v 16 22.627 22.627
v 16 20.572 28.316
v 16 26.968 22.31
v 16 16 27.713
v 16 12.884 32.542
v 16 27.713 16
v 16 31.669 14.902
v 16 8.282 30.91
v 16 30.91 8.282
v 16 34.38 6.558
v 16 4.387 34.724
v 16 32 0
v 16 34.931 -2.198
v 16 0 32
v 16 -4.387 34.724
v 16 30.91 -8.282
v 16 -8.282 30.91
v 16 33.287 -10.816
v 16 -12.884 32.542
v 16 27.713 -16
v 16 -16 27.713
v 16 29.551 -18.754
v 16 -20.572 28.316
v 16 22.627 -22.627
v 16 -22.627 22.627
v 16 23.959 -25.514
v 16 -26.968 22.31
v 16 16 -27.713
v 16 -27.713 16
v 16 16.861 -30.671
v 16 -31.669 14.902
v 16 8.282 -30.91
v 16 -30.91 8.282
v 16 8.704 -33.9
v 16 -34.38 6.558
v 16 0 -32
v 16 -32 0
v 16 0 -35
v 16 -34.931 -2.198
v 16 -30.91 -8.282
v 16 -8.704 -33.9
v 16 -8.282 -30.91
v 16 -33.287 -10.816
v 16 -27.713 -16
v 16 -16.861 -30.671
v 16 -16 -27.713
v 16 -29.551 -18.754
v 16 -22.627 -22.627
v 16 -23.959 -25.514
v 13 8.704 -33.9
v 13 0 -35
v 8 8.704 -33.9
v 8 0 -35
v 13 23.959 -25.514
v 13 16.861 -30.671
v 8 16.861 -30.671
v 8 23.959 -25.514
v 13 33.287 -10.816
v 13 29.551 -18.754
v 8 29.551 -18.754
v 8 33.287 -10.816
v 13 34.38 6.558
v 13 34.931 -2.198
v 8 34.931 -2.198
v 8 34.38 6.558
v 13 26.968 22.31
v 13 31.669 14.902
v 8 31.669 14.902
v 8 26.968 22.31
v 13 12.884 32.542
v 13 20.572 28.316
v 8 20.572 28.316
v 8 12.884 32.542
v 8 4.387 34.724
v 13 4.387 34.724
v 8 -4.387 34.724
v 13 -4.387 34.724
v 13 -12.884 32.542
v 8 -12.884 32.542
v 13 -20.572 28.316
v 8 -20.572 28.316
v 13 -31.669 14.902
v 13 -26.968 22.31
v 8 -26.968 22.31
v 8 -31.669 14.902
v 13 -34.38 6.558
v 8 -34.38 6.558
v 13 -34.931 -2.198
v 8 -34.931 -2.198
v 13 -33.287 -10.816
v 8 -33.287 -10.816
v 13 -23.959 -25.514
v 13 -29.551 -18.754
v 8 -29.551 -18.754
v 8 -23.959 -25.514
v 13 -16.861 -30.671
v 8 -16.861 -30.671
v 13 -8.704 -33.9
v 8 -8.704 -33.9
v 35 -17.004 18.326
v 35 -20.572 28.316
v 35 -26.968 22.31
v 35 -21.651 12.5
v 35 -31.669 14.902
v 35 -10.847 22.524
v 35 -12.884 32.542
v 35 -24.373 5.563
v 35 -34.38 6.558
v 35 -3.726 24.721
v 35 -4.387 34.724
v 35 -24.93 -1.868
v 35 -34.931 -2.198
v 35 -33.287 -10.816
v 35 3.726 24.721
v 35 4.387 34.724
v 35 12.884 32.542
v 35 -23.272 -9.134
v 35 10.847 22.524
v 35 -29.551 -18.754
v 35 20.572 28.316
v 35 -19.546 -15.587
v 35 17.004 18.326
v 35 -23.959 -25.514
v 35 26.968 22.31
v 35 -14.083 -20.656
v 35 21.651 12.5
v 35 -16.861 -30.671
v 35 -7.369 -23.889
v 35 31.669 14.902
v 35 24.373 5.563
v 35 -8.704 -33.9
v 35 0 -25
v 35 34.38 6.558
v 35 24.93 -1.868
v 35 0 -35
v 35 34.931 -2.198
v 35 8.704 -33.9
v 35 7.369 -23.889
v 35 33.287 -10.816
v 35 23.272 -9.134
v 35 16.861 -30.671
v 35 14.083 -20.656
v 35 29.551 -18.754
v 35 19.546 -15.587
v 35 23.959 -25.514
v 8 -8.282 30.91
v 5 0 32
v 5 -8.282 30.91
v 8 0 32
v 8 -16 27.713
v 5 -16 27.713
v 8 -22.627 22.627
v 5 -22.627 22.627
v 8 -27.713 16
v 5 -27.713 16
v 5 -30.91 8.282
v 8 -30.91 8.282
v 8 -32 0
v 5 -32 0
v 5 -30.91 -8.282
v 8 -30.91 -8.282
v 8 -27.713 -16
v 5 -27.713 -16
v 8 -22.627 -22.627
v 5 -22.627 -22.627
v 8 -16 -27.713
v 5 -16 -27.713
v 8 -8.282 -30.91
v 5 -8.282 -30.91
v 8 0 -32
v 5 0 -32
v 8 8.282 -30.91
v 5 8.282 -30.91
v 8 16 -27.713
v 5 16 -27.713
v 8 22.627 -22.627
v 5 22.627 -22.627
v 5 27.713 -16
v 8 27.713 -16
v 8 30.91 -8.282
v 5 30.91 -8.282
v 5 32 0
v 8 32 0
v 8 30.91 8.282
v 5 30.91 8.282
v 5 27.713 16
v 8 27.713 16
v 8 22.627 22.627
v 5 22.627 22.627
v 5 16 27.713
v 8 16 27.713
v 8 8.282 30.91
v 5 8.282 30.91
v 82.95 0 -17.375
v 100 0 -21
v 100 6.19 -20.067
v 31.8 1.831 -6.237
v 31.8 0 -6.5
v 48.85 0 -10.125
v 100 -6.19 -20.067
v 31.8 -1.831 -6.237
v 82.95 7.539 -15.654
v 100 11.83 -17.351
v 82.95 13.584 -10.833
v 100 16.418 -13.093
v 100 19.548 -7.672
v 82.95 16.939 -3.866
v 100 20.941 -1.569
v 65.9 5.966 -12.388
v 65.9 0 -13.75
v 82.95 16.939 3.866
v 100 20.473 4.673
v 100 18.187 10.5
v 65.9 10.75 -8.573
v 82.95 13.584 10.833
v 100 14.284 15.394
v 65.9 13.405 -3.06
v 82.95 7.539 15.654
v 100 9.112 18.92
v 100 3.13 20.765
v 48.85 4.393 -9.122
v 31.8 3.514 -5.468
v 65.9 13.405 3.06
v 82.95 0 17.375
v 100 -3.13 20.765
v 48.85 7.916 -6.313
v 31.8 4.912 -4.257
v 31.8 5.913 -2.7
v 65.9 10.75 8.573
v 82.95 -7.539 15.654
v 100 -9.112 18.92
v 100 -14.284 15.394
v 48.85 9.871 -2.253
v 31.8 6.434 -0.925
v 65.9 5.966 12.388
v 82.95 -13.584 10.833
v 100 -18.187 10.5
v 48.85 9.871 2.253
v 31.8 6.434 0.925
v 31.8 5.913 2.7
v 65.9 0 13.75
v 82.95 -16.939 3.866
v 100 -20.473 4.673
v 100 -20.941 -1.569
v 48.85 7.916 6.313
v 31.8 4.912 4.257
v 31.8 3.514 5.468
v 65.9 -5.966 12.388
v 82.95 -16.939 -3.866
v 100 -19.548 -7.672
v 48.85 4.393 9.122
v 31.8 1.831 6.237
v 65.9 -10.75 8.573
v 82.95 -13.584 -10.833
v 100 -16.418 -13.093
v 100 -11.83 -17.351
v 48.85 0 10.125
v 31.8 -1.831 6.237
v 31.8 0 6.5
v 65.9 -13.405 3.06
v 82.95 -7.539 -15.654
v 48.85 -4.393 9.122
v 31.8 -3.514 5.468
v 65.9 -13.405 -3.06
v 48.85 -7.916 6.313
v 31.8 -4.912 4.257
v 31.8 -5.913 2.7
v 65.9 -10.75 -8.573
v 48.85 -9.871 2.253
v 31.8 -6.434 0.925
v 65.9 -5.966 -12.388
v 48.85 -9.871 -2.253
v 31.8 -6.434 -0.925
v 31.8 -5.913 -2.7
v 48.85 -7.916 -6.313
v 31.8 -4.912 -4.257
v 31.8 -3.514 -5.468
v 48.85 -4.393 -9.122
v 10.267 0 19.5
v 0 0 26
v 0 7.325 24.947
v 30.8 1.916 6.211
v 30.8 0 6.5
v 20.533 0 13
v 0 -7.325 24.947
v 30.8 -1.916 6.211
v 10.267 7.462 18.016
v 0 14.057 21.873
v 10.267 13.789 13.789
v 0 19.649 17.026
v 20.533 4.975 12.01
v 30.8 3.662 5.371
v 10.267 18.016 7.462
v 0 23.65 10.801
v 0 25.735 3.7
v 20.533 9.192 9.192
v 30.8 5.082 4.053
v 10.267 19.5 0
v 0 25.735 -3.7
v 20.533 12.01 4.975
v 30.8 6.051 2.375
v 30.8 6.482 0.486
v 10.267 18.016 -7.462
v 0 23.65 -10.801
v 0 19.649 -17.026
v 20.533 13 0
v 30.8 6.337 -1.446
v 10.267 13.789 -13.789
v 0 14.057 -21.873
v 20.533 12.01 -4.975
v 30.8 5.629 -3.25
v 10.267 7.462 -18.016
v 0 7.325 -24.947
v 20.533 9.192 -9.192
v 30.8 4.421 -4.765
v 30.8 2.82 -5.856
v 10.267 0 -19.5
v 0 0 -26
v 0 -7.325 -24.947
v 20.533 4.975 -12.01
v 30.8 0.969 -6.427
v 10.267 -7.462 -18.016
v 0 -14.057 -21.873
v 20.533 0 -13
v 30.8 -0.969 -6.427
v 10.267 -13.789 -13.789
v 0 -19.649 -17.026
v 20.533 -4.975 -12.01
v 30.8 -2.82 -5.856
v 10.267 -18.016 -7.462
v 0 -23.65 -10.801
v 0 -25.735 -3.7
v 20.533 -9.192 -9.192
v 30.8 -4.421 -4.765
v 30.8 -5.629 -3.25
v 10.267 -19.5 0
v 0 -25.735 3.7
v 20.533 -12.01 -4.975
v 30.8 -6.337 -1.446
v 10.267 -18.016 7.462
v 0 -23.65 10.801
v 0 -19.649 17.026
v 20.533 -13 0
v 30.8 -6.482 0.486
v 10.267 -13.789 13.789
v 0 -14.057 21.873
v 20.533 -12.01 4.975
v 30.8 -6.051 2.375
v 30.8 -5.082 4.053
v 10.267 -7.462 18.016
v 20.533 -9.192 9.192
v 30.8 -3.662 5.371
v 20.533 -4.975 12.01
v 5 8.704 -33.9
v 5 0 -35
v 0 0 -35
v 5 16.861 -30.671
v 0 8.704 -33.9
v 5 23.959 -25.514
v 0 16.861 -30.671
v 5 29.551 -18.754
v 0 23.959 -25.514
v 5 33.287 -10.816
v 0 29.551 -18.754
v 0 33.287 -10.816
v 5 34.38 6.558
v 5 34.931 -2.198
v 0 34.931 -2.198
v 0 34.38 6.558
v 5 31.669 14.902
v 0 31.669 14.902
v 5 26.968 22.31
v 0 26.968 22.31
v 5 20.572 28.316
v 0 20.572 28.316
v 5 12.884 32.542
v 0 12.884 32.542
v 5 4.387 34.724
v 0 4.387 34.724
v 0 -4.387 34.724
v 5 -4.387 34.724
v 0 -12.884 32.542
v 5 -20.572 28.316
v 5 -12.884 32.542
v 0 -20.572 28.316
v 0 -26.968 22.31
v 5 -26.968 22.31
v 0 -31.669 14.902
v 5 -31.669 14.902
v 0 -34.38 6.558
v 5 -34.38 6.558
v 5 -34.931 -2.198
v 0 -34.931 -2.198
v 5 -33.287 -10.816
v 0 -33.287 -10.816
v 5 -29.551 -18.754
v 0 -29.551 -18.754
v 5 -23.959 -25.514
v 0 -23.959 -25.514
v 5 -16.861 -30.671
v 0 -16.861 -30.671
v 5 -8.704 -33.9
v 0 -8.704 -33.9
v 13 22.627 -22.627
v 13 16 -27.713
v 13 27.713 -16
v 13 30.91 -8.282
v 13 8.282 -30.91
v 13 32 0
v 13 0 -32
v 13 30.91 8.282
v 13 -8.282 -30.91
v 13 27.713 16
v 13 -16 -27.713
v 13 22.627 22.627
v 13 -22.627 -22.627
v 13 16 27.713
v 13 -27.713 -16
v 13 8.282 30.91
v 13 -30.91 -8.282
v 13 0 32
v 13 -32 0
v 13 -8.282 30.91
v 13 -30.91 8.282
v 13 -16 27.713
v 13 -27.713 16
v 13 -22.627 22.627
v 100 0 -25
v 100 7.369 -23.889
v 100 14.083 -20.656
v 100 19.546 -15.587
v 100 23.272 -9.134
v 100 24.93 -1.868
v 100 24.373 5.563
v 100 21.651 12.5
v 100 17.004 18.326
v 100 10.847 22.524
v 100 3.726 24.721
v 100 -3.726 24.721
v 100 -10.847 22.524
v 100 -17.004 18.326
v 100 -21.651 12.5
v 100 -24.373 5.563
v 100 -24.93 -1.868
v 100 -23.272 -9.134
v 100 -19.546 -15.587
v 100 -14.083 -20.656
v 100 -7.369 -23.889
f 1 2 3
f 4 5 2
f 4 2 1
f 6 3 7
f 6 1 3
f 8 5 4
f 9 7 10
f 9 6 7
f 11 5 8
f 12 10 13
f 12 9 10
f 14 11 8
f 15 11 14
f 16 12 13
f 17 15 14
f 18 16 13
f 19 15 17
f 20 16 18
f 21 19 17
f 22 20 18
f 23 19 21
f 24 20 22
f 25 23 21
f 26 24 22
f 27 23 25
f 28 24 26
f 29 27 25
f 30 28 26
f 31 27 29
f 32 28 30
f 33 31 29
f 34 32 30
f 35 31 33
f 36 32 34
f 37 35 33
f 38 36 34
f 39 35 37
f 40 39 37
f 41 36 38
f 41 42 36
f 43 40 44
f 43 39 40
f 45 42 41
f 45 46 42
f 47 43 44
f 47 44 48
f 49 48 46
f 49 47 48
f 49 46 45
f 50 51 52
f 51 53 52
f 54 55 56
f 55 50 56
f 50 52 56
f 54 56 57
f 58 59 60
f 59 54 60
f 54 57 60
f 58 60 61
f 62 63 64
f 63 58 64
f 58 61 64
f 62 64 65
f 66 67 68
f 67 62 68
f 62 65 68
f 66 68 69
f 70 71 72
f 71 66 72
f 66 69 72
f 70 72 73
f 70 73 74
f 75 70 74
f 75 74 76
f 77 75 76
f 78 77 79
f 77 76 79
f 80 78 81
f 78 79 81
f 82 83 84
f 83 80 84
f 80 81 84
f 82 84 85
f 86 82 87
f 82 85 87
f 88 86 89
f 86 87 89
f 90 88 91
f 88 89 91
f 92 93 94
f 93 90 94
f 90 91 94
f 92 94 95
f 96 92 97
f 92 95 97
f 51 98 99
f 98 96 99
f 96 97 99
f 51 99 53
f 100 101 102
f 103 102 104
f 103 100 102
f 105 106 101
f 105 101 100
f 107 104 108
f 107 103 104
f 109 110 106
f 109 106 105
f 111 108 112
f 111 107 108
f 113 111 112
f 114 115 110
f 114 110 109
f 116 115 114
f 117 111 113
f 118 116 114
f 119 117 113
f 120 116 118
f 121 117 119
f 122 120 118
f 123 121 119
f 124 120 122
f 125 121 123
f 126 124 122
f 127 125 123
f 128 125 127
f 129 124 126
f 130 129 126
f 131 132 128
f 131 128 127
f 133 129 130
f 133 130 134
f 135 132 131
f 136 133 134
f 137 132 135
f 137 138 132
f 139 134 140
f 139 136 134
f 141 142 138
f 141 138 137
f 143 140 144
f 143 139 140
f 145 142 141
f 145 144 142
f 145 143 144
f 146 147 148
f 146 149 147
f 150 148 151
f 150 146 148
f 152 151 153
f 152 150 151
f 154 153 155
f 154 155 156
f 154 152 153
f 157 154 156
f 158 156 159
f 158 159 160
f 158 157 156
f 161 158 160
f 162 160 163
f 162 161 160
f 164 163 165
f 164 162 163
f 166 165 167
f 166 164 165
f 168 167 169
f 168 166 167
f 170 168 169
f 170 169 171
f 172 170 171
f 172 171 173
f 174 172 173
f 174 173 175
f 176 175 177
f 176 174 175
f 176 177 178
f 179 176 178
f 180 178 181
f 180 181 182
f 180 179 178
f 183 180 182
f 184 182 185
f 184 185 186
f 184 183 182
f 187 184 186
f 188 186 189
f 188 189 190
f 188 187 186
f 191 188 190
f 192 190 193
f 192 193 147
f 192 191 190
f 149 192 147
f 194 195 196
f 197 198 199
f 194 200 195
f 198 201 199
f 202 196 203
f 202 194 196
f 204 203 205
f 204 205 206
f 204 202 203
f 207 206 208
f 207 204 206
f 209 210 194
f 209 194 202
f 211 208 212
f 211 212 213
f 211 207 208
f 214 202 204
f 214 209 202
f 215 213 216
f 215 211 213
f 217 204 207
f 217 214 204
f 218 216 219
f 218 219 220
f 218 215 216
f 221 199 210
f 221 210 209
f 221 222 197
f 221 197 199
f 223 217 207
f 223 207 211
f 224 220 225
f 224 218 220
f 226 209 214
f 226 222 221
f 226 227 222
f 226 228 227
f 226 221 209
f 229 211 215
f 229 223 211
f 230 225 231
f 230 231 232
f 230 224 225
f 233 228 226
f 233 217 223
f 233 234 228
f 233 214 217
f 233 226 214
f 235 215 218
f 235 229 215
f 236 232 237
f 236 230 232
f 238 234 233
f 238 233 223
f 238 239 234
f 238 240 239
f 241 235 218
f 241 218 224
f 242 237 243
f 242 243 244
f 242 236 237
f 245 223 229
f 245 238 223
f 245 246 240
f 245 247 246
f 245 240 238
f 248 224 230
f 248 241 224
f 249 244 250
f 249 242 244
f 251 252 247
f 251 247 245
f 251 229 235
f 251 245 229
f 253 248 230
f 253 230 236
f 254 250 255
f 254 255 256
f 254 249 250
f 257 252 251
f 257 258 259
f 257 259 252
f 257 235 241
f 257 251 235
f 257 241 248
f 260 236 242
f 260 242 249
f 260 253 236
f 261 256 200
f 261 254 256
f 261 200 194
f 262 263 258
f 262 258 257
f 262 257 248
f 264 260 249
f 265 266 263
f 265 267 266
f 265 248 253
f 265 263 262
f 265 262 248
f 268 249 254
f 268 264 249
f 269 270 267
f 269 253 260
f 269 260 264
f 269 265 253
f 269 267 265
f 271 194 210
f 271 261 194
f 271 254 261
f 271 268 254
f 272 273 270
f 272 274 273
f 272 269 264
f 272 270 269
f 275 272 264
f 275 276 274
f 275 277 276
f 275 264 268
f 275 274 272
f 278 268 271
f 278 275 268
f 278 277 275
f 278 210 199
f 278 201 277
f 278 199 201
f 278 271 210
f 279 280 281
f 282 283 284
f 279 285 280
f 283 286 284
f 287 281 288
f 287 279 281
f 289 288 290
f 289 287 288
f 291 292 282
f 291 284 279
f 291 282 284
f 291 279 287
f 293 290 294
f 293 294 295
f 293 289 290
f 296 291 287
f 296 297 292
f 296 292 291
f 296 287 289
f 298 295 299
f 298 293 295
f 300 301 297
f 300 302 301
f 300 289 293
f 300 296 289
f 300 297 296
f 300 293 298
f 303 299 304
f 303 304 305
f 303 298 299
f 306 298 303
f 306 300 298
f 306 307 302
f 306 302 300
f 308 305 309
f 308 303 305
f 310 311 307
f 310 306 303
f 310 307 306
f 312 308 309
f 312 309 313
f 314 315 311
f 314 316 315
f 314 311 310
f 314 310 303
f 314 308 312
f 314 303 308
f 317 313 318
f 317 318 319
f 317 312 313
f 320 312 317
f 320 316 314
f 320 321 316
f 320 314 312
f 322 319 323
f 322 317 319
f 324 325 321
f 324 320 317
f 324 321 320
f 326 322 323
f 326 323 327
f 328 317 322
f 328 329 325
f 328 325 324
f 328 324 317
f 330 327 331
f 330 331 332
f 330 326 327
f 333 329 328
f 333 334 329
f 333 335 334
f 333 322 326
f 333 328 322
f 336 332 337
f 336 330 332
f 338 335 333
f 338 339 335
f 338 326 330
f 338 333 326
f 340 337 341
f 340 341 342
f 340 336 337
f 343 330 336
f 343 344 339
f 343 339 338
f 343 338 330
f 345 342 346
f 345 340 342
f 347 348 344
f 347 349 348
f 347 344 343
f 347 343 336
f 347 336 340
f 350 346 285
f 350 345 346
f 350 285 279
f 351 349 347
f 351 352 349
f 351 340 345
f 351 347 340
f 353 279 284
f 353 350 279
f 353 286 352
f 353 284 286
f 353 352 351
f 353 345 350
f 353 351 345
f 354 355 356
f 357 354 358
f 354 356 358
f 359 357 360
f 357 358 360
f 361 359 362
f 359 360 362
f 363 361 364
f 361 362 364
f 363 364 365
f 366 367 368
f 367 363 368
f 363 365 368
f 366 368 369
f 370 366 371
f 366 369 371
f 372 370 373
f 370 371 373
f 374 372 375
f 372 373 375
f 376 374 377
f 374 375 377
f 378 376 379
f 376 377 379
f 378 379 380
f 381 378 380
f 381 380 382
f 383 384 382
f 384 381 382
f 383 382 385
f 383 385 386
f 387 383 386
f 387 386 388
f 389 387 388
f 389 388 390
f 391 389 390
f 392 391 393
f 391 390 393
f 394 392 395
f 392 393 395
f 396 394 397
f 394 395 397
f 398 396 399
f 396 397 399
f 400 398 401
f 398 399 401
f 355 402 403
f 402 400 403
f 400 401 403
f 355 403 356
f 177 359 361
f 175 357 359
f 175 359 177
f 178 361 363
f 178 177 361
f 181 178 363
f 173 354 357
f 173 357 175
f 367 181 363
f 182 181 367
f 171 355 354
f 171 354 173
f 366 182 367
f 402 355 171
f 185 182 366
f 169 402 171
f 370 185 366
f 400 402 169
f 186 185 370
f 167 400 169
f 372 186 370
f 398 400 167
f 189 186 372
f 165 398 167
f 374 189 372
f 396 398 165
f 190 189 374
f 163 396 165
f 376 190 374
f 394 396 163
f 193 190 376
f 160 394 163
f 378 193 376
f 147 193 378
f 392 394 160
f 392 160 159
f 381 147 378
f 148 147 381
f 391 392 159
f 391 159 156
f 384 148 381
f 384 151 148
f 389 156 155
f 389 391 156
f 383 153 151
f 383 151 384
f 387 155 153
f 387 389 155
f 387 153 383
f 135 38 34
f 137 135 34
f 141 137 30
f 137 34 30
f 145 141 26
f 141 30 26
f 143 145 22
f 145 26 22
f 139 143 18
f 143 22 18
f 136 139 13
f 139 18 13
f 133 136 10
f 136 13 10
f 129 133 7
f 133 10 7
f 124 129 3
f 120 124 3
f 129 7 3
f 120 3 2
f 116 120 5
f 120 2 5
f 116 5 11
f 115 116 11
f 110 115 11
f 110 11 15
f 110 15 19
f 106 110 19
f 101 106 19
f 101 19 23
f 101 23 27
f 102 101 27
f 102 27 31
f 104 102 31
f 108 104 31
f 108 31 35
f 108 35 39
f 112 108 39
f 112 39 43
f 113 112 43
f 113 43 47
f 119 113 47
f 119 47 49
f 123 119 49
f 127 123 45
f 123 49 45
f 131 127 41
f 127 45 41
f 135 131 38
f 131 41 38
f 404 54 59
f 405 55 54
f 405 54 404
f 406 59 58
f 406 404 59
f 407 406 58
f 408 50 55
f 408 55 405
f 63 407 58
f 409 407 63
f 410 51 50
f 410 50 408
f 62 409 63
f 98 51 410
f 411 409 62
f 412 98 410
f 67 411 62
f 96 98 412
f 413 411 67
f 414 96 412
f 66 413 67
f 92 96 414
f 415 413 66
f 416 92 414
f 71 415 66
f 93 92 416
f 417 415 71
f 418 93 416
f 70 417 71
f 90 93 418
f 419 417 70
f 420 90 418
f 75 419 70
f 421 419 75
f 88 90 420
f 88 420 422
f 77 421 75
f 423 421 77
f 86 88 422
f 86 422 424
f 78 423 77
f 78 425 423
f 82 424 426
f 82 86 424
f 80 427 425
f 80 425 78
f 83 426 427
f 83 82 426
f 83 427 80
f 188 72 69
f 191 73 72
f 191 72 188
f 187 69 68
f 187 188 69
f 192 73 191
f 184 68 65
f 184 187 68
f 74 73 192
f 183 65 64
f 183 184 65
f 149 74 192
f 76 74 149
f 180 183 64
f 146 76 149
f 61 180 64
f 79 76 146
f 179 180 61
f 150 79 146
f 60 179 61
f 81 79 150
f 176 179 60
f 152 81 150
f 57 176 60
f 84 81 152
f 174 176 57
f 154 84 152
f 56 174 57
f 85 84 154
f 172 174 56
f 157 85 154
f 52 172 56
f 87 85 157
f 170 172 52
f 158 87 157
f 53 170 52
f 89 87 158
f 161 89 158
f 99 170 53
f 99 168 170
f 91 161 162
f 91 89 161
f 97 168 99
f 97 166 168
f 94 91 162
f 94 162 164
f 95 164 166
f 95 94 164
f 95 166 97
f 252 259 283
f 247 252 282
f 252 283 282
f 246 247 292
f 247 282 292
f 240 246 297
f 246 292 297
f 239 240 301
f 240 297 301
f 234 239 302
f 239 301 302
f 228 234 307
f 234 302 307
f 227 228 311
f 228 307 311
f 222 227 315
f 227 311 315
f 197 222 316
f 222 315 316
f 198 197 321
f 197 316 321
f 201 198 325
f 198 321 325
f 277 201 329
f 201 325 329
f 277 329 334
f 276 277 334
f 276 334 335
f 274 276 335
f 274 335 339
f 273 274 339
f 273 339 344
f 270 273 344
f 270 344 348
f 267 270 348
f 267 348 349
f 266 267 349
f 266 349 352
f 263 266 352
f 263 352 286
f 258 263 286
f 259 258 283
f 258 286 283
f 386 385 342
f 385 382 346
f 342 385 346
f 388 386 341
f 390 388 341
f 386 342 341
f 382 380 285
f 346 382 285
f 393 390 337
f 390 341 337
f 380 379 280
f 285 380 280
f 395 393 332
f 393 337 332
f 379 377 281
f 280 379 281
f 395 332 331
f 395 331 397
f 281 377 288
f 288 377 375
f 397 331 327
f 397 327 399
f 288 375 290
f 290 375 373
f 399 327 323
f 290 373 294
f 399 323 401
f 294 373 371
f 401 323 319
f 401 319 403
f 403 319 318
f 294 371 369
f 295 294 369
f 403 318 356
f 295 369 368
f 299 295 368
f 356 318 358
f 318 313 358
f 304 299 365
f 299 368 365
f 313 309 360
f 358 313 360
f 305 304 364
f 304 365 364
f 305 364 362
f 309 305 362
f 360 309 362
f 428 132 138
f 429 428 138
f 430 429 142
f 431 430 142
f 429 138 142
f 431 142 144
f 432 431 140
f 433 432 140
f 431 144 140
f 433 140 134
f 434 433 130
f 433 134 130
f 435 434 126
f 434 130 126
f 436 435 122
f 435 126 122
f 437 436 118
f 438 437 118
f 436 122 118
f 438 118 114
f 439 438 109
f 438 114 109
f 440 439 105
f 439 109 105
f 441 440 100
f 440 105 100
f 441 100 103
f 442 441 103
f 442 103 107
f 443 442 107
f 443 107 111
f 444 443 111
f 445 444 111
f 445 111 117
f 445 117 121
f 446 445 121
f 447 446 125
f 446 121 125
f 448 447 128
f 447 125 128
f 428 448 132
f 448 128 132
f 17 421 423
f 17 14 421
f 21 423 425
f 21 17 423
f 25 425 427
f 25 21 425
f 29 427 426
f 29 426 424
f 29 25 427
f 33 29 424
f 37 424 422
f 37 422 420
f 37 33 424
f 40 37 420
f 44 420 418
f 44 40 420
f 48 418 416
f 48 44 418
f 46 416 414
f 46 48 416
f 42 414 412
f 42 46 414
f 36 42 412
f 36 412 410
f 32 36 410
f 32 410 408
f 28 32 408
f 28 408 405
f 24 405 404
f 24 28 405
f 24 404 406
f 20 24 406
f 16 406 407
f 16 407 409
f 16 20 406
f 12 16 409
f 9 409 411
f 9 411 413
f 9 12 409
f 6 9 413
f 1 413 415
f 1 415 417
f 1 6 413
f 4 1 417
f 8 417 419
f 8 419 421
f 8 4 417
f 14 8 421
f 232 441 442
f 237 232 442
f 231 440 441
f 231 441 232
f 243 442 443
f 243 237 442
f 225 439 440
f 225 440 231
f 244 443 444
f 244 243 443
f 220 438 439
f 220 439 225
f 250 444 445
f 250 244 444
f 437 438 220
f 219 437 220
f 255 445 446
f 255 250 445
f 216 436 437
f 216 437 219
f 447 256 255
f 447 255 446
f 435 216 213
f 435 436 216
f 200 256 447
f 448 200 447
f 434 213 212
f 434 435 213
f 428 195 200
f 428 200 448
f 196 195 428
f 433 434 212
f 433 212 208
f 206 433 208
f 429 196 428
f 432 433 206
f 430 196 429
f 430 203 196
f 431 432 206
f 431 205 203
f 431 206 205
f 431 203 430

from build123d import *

# Parameters (mm, degrees)
SKETCH1_R           = 35
BOSS_EXTRUDE1_DEPTH = 35
SKETCH2_R           = 25
BOSS_EXTRUDE2_DEPTH = 65
SKETCH5_R           = 26
SKETCH7_R           = 6.5
SKETCH6_R           = 21
SKETCH8_R           = 6.5
SKETCH13_R          = 6.5
CUT_EXTRUDE2_DEPTH  = 100


with BuildPart() as part:
    # Sketch1 → Boss-Extrude1 (new body)
    with BuildSketch(Plane(origin=(0, 0, 0), x_dir=(0, 0, -1), z_dir=(1, 0, 0))):
        Circle(SKETCH1_R)
    extrude(amount=BOSS_EXTRUDE1_DEPTH)

    # Sketch2 → Boss-Extrude2 (add)
    with BuildSketch(Plane(origin=(35, 0, 0), x_dir=(0, 0, -1), z_dir=(1, 0, 0))):
        Circle(SKETCH2_R)
    extrude(amount=BOSS_EXTRUDE2_DEPTH)

    # Sketch5 → Cut-Loft1 section 0
    with BuildSketch(Plane.ZY):
        Circle(SKETCH5_R)
    # Sketch7 → Cut-Loft1 section 1
    with BuildSketch(Plane.ZY.offset(-30.8)):
        Circle(SKETCH7_R)
    loft(mode=Mode.SUBTRACT)

    # Sketch6 → Cut-Loft2 section 0
    with BuildSketch(Plane(origin=(100, 0, 0), x_dir=(0, 0, -1), z_dir=(1, 0, 0))):
        Circle(SKETCH6_R)
    # Sketch8 → Cut-Loft2 section 1
    with BuildSketch(Plane(origin=(31.8, 0, 0), x_dir=(0, 0, -1), z_dir=(1, 0, 0))):
        Circle(SKETCH8_R)
    loft(mode=Mode.SUBTRACT)

    # Sketch12 → Cut-Revolve1 (revolve, cut)
    with BuildSketch(Plane.XY, mode=Mode.PRIVATE) as cut_revolve1_sk:
        Polygon((0, 35), (5, 35), (5, 32), (8, 32), (8, 35), (13, 35), (13, 32), (16, 32), (16, 35), (16, 38.455510313), (0, 38.455510313), align=None)
    revolve(cut_revolve1_sk.sketch.rotate(Axis((0, 0, 0), (1, 0, 0)), 90), axis=Axis((0, 0, 0), (1, 0, 0)), mode=Mode.SUBTRACT)

    # Sketch13 → Cut-Extrude2 (cut)
    with BuildSketch(Plane.ZY):
        Circle(SKETCH13_R)
    extrude(amount=-CUT_EXTRUDE2_DEPTH, mode=Mode.SUBTRACT)


solid = part.part
